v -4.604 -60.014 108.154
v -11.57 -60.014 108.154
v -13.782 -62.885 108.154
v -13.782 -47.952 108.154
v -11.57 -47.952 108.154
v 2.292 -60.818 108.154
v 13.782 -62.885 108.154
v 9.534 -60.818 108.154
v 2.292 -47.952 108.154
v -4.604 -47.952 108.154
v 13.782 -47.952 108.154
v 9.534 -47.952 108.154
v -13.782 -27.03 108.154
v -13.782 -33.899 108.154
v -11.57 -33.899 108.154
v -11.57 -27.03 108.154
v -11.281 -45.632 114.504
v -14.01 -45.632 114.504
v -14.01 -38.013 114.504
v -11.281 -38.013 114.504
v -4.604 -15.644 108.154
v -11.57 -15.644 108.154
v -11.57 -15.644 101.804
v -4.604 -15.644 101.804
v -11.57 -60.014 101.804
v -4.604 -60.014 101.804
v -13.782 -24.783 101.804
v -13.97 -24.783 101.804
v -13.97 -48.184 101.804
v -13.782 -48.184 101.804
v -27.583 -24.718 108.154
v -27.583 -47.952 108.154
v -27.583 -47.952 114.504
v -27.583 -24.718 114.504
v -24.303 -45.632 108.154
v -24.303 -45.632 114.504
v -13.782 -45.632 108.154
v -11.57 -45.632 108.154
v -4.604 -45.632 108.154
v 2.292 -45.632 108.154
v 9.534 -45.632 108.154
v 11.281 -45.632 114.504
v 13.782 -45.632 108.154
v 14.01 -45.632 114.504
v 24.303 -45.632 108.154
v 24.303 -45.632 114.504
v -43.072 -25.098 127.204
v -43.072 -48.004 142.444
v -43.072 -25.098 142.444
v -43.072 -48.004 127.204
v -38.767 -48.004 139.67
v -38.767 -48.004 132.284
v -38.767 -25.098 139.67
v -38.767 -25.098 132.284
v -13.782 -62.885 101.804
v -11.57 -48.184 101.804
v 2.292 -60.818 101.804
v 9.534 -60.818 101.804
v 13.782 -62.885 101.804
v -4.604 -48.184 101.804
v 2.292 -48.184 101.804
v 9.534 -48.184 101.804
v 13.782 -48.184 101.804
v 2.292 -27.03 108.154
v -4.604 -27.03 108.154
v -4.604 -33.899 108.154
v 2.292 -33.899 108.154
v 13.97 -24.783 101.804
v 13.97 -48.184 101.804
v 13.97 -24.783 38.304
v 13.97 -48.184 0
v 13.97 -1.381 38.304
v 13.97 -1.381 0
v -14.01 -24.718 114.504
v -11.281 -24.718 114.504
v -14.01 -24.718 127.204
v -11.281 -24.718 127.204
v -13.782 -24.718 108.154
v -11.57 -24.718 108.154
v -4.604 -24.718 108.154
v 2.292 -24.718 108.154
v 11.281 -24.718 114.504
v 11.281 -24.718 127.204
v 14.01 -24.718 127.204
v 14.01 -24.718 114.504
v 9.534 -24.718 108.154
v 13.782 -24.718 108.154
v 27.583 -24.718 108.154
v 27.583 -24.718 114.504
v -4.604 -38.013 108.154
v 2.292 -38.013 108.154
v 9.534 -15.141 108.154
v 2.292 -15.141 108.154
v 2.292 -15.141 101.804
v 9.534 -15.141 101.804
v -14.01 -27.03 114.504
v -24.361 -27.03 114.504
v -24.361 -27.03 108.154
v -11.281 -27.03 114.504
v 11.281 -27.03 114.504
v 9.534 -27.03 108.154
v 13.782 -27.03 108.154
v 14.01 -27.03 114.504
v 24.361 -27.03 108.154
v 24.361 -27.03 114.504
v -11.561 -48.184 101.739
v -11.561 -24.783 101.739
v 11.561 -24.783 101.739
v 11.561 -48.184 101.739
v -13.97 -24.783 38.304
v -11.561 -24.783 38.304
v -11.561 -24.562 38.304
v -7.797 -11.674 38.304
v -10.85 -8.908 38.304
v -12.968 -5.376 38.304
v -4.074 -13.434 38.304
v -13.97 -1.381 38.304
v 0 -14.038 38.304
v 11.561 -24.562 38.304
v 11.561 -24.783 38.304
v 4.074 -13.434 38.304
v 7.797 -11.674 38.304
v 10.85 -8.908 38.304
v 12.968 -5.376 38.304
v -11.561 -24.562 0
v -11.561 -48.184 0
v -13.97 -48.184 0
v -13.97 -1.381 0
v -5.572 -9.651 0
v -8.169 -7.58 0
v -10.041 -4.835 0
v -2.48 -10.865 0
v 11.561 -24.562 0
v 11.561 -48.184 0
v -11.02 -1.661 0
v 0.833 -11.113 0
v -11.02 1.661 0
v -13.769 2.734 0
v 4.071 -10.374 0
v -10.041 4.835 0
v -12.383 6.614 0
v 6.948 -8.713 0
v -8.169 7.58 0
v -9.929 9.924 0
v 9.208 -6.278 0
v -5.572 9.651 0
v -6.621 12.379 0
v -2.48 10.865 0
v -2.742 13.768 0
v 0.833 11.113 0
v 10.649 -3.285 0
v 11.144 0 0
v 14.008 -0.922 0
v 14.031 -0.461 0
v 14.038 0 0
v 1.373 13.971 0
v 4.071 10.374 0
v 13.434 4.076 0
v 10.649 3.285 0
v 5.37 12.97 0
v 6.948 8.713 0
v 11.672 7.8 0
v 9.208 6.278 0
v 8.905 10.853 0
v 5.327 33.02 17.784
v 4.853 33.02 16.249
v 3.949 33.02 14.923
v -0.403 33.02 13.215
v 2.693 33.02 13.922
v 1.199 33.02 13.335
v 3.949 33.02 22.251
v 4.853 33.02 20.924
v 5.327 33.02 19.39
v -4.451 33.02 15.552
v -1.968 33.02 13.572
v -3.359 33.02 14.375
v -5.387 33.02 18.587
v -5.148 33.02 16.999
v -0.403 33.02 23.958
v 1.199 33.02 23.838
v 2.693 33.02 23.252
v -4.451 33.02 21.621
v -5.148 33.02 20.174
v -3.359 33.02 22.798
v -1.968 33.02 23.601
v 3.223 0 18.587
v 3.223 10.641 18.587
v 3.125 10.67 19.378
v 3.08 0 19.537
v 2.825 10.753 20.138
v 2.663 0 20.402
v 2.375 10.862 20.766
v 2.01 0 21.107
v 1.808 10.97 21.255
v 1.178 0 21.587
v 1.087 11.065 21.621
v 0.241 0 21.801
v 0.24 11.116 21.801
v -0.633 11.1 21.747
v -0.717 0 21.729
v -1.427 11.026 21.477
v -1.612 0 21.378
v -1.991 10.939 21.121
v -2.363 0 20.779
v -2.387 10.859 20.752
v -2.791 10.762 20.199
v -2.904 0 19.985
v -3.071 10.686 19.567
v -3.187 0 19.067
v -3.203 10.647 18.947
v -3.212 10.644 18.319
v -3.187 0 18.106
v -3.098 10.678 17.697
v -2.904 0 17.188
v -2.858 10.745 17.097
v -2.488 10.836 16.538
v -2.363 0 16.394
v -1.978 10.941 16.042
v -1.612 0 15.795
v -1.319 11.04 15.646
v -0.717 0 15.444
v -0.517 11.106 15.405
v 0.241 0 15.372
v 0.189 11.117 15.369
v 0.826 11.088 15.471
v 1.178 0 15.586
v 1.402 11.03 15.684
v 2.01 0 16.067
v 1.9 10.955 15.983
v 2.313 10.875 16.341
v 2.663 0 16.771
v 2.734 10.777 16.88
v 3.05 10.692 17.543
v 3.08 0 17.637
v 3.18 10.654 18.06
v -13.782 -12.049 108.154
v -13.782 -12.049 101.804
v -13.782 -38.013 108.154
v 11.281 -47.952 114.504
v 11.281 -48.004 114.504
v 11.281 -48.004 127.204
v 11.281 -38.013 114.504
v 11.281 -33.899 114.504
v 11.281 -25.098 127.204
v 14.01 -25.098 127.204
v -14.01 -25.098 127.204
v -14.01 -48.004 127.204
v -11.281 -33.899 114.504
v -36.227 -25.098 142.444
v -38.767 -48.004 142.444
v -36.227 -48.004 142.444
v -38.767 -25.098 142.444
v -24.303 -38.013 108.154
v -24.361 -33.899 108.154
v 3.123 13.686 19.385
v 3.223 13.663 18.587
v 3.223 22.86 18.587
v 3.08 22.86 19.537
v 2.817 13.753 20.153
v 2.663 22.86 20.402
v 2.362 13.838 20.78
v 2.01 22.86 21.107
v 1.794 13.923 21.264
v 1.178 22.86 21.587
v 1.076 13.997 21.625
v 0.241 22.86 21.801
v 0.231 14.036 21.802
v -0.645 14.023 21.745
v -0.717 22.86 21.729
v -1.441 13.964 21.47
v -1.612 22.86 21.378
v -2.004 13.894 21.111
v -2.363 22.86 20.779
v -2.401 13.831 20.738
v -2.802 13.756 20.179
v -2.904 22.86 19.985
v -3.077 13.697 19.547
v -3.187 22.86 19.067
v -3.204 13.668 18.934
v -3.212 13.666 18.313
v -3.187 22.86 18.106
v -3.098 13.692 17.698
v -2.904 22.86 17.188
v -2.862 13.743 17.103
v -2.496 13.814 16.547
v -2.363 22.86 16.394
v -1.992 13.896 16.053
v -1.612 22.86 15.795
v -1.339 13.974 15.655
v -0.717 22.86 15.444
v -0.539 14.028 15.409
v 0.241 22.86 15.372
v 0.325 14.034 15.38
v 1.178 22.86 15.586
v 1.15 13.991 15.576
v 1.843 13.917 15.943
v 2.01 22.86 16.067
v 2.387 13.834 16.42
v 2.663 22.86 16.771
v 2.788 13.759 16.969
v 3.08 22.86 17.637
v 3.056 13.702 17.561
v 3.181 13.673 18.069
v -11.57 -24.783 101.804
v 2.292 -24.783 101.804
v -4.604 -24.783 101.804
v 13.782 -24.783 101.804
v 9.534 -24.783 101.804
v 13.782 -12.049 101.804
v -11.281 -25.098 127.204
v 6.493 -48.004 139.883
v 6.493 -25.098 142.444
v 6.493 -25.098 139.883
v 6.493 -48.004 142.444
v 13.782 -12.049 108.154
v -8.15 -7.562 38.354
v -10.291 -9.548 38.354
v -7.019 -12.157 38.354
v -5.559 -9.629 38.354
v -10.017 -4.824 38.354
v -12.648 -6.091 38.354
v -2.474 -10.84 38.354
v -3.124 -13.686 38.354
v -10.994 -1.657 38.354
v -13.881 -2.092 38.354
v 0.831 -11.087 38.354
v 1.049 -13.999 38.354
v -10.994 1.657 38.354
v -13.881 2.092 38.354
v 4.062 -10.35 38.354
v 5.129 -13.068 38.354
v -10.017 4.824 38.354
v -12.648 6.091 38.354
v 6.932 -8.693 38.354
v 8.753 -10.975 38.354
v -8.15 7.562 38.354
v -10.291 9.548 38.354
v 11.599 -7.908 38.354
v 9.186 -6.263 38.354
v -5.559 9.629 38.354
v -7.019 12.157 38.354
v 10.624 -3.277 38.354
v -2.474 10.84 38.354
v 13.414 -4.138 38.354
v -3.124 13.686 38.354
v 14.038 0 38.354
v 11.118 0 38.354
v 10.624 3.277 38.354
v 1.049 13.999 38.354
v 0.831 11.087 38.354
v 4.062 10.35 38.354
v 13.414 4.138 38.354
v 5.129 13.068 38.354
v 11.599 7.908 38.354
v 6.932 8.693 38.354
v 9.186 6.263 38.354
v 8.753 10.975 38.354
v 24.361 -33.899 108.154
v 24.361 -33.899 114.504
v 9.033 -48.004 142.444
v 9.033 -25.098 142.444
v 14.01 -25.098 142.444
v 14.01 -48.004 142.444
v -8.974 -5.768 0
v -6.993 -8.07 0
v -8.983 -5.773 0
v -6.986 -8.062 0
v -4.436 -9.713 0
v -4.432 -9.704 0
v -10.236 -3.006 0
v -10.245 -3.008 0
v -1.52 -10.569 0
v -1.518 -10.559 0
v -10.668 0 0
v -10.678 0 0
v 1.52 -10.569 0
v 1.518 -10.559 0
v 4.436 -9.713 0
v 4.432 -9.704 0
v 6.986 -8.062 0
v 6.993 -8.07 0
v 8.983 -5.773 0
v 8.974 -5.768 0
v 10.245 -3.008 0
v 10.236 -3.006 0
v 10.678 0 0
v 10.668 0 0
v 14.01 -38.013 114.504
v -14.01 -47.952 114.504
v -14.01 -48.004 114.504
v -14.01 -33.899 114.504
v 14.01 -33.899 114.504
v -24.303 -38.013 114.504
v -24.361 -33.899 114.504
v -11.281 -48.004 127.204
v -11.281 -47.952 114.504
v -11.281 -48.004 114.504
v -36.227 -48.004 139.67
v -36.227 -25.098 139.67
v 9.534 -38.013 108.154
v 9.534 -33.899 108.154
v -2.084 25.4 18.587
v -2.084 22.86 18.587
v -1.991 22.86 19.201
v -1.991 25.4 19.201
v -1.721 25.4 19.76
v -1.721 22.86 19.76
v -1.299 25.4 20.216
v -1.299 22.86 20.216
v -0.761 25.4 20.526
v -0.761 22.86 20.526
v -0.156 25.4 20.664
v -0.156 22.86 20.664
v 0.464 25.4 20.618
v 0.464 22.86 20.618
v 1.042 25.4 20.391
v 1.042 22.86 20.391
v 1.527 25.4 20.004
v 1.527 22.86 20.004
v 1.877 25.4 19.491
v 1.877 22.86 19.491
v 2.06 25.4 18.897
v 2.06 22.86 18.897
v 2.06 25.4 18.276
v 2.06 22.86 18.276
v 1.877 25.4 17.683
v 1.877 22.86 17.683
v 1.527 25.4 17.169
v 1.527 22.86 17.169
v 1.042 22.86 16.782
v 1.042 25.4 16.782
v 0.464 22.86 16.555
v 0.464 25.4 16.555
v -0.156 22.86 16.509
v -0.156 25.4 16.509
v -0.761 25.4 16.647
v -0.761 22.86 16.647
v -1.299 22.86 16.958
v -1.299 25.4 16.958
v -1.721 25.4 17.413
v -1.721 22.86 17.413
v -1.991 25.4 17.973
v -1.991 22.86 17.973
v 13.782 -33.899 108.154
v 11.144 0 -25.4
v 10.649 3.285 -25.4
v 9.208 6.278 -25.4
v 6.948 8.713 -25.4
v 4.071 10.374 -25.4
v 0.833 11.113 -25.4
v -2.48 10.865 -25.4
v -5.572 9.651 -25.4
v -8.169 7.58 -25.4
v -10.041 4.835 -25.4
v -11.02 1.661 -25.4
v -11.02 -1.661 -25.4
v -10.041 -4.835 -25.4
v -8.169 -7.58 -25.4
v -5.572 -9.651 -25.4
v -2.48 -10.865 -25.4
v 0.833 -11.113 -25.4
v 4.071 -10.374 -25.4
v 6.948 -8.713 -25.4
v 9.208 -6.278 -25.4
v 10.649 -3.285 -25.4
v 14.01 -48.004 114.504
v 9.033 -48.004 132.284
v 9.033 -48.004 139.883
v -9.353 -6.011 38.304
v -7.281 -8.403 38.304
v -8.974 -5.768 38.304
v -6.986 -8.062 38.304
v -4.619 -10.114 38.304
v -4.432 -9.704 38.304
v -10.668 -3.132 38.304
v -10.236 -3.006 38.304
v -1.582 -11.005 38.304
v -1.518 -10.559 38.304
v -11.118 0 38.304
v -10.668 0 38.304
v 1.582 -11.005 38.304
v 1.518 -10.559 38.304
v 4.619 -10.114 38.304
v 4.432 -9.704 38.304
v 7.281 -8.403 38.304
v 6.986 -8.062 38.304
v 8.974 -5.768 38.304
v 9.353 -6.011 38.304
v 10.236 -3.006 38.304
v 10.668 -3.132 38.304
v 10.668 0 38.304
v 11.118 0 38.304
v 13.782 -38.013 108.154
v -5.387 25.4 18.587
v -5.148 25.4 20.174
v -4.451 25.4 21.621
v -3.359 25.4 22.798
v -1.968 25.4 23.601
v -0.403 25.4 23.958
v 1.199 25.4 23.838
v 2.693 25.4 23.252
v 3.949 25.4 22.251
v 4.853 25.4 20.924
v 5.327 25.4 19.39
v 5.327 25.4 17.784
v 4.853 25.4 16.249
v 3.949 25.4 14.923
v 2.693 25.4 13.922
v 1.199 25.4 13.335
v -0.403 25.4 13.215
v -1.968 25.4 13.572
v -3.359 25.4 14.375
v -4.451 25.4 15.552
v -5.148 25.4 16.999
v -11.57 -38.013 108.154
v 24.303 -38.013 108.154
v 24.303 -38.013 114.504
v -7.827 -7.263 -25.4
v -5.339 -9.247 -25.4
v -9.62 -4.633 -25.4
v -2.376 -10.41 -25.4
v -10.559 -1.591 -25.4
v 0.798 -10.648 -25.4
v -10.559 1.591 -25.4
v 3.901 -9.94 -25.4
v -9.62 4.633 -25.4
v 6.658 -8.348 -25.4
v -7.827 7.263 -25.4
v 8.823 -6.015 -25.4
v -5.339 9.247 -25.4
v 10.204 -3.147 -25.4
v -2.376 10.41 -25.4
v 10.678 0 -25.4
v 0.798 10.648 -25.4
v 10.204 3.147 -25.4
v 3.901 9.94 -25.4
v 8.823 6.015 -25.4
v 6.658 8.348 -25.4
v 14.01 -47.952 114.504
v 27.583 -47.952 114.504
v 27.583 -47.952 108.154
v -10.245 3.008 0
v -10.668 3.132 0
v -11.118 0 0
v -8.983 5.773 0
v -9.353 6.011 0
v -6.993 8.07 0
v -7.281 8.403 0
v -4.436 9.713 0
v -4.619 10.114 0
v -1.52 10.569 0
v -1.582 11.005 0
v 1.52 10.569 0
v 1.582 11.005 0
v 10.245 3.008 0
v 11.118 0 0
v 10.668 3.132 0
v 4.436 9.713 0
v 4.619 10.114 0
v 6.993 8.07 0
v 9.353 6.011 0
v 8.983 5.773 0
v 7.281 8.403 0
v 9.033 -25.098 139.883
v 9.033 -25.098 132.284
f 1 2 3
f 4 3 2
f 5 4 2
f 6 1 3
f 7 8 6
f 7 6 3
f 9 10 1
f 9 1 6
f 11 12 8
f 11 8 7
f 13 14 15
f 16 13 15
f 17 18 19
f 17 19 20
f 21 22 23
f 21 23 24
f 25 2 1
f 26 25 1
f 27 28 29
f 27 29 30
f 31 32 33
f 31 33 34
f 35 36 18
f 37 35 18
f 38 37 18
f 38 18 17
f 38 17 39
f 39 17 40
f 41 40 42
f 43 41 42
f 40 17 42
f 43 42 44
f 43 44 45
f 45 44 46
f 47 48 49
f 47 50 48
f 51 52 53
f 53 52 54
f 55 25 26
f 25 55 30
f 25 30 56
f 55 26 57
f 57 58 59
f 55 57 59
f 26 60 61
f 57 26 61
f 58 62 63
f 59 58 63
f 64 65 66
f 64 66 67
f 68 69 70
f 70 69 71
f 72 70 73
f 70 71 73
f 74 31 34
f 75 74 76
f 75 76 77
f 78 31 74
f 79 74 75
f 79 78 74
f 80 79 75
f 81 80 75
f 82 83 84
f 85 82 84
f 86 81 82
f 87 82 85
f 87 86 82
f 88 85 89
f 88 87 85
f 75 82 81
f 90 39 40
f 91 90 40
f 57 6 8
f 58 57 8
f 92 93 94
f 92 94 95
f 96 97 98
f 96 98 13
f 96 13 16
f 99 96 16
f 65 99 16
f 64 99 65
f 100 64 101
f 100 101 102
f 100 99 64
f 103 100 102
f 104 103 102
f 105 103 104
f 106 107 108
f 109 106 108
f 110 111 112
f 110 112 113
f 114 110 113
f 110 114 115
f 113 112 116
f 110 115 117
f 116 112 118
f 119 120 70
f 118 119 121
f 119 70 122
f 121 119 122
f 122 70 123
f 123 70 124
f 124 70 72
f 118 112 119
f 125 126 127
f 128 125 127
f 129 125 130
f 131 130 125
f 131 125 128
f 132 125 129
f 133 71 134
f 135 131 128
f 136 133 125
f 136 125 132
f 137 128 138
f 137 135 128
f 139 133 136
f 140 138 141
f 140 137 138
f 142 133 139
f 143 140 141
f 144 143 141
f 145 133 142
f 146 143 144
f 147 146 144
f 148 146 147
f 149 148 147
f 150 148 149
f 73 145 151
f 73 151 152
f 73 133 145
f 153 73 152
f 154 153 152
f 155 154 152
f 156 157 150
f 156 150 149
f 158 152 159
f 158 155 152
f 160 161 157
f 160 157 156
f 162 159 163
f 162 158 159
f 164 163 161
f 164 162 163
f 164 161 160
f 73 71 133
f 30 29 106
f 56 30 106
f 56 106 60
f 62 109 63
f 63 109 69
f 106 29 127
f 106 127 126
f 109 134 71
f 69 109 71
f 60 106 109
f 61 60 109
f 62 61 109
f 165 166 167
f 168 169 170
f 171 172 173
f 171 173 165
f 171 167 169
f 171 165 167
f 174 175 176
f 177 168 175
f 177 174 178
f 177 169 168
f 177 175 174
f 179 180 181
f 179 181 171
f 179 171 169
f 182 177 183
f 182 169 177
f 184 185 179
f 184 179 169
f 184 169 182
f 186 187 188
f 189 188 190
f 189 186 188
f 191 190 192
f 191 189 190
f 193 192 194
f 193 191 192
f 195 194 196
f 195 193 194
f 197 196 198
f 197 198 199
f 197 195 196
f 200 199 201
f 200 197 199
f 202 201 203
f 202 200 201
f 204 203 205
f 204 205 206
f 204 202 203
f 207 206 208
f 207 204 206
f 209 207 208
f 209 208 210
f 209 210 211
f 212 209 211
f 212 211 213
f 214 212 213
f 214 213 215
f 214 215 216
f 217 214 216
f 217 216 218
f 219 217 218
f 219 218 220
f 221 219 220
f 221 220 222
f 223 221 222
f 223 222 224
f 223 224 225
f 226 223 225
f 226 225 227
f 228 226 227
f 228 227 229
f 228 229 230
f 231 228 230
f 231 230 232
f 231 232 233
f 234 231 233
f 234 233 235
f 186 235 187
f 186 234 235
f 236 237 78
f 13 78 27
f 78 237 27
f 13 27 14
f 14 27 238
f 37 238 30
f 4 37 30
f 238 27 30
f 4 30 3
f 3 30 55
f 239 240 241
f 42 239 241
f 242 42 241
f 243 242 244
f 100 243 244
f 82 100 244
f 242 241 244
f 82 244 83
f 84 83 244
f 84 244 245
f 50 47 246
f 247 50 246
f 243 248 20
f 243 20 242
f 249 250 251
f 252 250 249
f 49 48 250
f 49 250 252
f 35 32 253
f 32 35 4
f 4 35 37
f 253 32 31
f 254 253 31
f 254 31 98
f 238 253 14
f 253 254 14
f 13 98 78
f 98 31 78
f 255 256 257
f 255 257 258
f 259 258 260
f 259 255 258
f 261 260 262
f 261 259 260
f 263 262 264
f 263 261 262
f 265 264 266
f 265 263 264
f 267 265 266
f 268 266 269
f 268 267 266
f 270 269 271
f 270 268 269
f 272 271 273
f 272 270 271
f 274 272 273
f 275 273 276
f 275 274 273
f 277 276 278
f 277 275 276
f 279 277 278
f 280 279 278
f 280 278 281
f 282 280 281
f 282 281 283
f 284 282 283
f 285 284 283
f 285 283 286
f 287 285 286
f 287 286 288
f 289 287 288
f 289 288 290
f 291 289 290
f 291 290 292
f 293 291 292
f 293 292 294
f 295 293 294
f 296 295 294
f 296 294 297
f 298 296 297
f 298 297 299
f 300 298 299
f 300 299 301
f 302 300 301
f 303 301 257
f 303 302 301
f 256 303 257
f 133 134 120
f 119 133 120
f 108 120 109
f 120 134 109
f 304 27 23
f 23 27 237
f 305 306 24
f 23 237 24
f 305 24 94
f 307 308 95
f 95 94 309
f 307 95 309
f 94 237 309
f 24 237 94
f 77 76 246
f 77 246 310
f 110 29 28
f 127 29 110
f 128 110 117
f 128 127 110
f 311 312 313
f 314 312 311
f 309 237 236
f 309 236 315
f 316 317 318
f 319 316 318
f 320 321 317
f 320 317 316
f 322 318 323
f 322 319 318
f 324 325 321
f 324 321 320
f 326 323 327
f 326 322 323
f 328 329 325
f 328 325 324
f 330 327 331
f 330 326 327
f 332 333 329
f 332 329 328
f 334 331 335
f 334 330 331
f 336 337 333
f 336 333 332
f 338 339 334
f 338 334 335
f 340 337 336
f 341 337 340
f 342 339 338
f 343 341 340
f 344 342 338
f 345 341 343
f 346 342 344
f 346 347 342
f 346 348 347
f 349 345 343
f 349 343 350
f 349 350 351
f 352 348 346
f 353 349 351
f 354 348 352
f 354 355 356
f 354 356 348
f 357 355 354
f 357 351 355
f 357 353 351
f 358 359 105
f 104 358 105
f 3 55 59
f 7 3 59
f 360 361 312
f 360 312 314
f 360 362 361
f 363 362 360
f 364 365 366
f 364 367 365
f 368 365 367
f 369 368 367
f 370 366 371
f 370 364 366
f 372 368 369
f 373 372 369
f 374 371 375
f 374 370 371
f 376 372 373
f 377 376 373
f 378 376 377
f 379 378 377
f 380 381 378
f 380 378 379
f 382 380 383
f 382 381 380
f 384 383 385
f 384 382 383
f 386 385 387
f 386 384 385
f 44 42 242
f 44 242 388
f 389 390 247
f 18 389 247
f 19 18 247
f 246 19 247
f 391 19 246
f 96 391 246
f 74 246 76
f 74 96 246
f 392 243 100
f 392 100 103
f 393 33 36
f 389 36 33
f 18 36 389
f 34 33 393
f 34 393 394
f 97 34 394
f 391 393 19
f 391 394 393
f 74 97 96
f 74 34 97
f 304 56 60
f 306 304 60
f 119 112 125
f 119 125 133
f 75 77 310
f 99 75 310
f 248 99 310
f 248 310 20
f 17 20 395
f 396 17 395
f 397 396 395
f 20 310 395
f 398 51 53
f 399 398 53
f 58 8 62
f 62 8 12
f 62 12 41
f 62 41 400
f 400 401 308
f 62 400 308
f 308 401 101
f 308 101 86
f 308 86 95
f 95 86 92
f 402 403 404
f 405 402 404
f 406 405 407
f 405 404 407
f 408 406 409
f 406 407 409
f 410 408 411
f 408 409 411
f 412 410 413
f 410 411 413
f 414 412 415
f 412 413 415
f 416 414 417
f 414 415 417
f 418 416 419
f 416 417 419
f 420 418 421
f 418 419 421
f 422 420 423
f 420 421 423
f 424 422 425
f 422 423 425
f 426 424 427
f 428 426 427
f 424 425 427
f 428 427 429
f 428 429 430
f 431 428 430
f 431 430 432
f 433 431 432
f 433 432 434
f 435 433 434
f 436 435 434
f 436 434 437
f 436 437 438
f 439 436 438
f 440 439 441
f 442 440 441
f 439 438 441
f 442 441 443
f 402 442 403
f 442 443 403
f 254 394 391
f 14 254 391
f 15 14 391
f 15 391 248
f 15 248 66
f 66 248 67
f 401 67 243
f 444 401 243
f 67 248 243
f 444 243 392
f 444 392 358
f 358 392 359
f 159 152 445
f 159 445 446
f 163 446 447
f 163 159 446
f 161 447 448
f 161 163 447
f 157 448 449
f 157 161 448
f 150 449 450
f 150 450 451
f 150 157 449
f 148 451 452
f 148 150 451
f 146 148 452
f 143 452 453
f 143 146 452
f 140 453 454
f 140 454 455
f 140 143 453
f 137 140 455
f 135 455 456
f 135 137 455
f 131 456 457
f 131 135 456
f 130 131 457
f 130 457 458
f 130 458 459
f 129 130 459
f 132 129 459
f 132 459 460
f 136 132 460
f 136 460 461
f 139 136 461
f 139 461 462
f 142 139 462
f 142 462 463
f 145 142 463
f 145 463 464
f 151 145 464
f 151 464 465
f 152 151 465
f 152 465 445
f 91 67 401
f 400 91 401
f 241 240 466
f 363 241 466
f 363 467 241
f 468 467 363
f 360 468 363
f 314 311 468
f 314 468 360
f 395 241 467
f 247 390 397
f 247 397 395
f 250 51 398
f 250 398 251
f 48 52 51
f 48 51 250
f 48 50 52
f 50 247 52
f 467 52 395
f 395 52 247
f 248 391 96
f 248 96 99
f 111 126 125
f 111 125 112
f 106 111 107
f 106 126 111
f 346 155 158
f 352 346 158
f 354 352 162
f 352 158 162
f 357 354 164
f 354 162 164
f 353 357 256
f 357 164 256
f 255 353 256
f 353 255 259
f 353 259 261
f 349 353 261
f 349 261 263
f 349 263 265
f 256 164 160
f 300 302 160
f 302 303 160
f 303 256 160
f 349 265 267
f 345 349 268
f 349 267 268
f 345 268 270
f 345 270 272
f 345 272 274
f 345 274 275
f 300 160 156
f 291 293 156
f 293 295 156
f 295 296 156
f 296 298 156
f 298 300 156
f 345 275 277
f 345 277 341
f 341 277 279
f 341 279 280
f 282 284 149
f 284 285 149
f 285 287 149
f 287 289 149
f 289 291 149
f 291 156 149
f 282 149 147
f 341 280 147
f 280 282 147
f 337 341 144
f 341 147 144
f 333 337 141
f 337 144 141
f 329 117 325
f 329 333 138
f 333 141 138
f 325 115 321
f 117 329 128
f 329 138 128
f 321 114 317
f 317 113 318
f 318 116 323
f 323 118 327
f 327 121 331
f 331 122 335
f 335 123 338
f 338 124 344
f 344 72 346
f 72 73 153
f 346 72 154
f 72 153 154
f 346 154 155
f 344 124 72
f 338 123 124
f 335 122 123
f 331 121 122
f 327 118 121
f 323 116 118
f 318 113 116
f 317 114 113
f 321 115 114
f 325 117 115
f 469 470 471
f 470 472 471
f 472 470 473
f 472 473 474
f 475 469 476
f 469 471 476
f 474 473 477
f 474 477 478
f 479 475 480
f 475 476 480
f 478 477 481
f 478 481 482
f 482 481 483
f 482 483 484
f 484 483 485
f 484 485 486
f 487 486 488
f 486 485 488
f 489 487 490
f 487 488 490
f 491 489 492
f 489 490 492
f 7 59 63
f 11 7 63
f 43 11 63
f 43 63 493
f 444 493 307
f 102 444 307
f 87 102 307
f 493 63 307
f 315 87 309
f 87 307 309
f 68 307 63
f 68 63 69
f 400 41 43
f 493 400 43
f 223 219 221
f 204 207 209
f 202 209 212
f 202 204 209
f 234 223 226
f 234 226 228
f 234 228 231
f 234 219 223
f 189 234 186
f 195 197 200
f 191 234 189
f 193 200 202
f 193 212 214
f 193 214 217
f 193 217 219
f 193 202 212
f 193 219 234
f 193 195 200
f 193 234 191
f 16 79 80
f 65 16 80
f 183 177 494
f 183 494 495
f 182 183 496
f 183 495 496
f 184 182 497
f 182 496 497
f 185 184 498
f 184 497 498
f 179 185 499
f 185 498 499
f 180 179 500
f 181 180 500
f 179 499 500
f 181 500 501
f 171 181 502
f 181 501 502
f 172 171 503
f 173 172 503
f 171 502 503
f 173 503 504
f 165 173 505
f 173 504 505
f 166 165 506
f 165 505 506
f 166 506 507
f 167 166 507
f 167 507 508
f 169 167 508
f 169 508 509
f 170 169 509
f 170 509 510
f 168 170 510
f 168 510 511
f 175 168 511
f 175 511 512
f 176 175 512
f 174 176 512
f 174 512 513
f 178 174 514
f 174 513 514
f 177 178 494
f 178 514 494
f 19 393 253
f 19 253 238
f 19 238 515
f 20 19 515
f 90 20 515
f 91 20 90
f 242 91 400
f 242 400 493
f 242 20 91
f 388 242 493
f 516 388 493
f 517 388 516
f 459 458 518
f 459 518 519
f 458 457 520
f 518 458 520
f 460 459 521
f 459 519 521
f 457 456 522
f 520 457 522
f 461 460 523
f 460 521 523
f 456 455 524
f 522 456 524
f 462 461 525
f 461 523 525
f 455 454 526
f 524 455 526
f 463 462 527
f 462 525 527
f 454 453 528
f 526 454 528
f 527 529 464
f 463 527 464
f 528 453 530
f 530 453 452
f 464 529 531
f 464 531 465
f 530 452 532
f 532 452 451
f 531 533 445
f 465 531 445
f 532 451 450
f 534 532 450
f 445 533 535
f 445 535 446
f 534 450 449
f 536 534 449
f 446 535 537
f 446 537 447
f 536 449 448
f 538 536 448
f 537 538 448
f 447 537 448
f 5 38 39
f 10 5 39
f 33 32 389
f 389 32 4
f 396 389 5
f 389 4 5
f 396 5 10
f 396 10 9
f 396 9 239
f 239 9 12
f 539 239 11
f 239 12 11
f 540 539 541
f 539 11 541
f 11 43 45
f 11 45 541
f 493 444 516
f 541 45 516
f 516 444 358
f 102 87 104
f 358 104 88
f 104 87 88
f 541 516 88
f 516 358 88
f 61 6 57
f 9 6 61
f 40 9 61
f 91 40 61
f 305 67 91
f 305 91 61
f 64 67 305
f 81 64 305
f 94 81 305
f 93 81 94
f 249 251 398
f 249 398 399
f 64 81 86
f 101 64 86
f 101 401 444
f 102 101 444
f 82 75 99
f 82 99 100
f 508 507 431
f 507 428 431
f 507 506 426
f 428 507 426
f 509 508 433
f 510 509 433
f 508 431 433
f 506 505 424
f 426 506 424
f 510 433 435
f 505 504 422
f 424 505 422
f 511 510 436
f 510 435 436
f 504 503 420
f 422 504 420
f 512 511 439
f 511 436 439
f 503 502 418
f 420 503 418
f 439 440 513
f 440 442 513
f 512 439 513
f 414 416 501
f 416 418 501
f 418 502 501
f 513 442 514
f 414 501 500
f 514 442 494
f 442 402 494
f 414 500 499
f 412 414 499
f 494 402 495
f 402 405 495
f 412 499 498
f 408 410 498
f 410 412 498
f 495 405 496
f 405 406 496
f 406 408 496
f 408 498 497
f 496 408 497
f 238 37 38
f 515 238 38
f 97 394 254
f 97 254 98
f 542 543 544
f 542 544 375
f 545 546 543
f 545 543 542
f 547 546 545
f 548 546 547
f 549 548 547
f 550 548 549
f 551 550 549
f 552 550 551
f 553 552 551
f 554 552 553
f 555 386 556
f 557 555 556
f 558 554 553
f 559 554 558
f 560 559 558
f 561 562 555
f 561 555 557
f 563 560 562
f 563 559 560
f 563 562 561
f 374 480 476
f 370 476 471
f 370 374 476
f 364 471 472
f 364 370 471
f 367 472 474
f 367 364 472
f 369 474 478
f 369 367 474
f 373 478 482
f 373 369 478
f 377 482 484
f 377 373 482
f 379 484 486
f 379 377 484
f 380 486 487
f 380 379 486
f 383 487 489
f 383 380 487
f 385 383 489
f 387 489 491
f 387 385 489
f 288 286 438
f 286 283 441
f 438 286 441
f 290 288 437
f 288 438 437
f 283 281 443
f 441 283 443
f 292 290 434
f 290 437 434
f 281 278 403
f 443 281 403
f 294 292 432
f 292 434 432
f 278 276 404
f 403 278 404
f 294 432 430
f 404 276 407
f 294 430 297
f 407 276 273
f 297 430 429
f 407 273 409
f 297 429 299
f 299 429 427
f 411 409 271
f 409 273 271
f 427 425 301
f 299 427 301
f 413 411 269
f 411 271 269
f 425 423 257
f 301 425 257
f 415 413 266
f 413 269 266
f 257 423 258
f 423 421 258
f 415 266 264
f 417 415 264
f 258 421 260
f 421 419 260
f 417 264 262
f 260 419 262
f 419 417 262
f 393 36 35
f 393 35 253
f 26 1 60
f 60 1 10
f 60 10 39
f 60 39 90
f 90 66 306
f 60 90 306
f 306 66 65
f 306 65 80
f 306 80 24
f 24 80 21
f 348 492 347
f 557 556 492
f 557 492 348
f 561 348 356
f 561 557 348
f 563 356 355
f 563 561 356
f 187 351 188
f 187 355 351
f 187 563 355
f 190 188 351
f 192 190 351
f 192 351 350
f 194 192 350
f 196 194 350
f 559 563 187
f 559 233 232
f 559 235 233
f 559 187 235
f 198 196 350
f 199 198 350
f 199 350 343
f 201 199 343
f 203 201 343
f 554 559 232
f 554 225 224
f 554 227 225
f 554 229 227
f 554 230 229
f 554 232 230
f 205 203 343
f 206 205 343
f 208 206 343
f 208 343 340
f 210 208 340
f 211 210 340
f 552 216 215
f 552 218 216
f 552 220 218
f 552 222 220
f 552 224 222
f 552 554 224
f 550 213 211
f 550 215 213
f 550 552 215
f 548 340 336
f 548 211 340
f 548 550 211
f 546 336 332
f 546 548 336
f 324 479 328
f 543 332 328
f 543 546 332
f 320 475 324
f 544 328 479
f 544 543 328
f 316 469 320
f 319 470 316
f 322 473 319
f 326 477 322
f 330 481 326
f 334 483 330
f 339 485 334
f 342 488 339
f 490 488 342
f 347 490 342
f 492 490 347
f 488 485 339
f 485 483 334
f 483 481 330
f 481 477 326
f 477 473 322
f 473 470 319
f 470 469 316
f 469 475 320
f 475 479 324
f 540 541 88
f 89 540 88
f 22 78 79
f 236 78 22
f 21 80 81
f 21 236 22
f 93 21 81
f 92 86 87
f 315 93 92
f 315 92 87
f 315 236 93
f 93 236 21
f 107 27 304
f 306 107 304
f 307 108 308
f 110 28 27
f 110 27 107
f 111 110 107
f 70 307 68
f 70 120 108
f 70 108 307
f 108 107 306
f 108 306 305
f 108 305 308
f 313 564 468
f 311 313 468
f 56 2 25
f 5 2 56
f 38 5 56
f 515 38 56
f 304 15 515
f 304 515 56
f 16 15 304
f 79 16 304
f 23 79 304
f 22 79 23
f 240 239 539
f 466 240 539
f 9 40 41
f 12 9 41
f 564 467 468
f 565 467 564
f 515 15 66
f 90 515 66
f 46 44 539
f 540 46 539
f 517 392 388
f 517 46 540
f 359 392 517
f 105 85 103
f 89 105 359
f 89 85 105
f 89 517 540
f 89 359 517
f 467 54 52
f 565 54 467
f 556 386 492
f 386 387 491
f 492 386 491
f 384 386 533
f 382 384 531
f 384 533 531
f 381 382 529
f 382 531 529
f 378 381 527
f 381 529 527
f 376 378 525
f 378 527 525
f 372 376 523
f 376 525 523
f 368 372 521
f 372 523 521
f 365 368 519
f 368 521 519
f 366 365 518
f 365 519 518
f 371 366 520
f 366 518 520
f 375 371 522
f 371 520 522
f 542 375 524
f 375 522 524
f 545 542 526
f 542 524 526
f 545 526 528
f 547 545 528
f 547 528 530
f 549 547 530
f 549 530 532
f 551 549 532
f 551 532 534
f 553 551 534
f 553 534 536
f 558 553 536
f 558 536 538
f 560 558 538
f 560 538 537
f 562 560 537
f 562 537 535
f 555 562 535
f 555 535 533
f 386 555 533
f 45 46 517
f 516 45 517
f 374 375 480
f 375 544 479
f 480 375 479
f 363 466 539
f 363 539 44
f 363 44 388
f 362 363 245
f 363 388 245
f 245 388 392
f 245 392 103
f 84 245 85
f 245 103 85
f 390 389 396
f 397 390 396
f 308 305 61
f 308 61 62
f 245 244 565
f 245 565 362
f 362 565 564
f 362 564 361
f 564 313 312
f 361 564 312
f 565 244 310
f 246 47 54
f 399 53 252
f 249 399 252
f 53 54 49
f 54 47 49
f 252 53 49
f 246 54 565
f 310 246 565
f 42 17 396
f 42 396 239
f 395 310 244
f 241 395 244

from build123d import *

# Parameters (mm, degrees)
F0_R           = 11.4851473357
F1_DEPTH       = 25.4
F2_R           = 14.0381408387
F3_DEPTH       = 38.354
F4_R           = 11.1184182472
F5_DEPTH       = 40.64
F6_R           = 11.1443418508
F7_DEPTH       = 25.4
F8_R           = 10.6779324927
F9_DEPTH       = 25.4
F10_W          = 48.1841601431
F10_H          = 38.3043847978
F11_DEPTH      = 13.97
F11_DEPTH_BACK = 13.97
F12_W          = 27.94
F12_H          = 23.4013380416
F13_DEPTH      = 63.5
F14_W          = 27.5632794946
F14_H          = 12.7333622493
F14_H_2        = 23.4013380416
F14_H_3        = 14.7006912157
F15_DEPTH      = 6.35
F16_W          = 7.2420062497
F16_H          = 45.677350834
F16_W_2        = 6.9660460576
F16_H_2        = 44.3694461137
F17_DEPTH      = 6.35
F18_W          = 55.1662780344
F18_H          = 23.233897984
F19_DEPTH      = 6.35
F20_W          = 48.7214699388
F20_H          = 6.8689957261
F20_W_2        = 48.6058108509
F20_H_2        = 7.6186433434
F21_DEPTH      = 6.35
F22_W          = 23.1224743262
F22_H          = 101.739127886
F23_DEPTH      = 23.622
F24_W          = 28.0196964741
F24_H          = 23.2863202691
F25_DEPTH      = 12.7
F26_W          = 22.5610751659
F26_H          = 2.6592202485
F26_H_2        = 23.2863202691
F27_DEPTH      = 12.7
F28_W          = 54.3520981446
F28_H          = 22.9060128331
F28_W_2        = 2.7293106541
F29_DEPTH      = 5.08
F30_W          = 4.3049231172
F30_H          = 22.9060128331
F30_W_2        = 4.9764737487
F31_DEPTH      = 10.16
F32_W          = 22.9060128331
F32_H          = 2.5616861427
F33_DEPTH      = 2.54
F34_W          = 22.9060128331
F34_H          = 2.7740425909
F35_DEPTH      = 2.54
F36_R          = 10.668
F37_DEPTH      = 40.64
F38_R          = 3.2231915419
F39_DEPTH      = 22.86
F40_R          = 2.0835322845
F41_DEPTH      = 2.54
F42_R          = 5.3868280623
F43_DEPTH      = 7.62


with BuildPart() as f1:
    # F0 (on Top) → F1 (new body)
    with BuildSketch(Plane.XY):
        Circle(F0_R)
    extrude(amount=F1_DEPTH)


with BuildPart() as f3:
    # F2 (on Top) → F3 (new body)
    with BuildSketch(Plane.XY):
        Circle(F2_R)
    extrude(amount=F3_DEPTH)


with BuildPart() as f5_tool:
    # F4 (on Top) → F5 (new body)
    with BuildSketch(Plane.XY):
        Circle(F4_R)
    extrude(amount=F5_DEPTH)


with BuildPart() as f1_1:
    add(f1.part)

    # F5: cut by f5_tool
    add(f5_tool.part, mode=Mode.SUBTRACT)



with BuildPart() as f3_1:
    add(f3.part)

    # F5: cut by f5_tool
    add(f5_tool.part, mode=Mode.SUBTRACT)


with BuildPart() as f7:
    # F6 (on Top) → F7 (new body)
    with BuildSketch(Plane.XY):
        Circle(F6_R)
    extrude(amount=-F7_DEPTH)

    # F8 (on face) → F9 (cut)
    with BuildSketch(Plane(origin=(0, 0, -25.4), x_dir=(1, 0, 0), z_dir=(0, 0, -1))):
        Circle(F8_R)
    extrude(amount=-F9_DEPTH, mode=Mode.SUBTRACT)


with BuildPart() as f1_2:
    add(f1_1.part)

    add(f3_1.part)  # F11 merges F3

    add(f7.part)  # F11 merges F7
    # F10 (on Right) → F11 (join, two sides)
    with BuildSketch(Plane.YZ) as f11_sk:
        with Locations((-24.0920800716, 19.1521923989)):
            Rectangle(F10_W, F10_H)
    extrude(amount=F11_DEPTH)
    extrude(f11_sk.sketch, amount=-F11_DEPTH_BACK)

    # F12 (on face) → F13 (join)
    with BuildSketch(Plane.XY.offset(38.3043847978)):
        with Locations((0, -36.4834911223)):
            Rectangle(F12_W, F12_H)
    extrude(amount=F13_DEPTH)

    # F14 (on face) → F15 (join)
    with BuildSketch(Plane.XY.offset(101.8043847978)):
        with Locations((0, -18.4161409769)):
            Rectangle(F14_W, F14_H)
        with Locations((0, -36.4834911223)):
            Rectangle(F14_W, F14_H_2)
        with Locations((0, -55.534505751)):
            Rectangle(F14_W, F14_H_3)
    extrude(amount=F15_DEPTH)

    # F16 (on face) → F17 (cut)
    with BuildSketch(Plane.XY.offset(108.1543847978)):
        with Locations((5.9133009054, -37.9796130583)):
            Rectangle(F16_W, F16_H)
        with Locations((-8.0874641426, -37.8289176151)):
            Rectangle(F16_W_2, F16_H_2)
    extrude(amount=-F17_DEPTH, mode=Mode.SUBTRACT)

    # F18 (on face) → F19 (join)
    with BuildSketch(Plane.XY.offset(108.1543847978)):
        with Locations((0, -36.3346077502)):
            Rectangle(F18_W, F18_H)
    extrude(amount=F19_DEPTH)

    # F20 (on face) → F21 (cut)
    with BuildSketch(Plane.XY.offset(114.5043847978)):
        with Locations((0, -30.4647795856)):
            Rectangle(F20_W, F20_H)
        with Locations((0, -41.8227724731)):
            Rectangle(F20_W_2, F20_H_2)
    extrude(amount=-F21_DEPTH, mode=Mode.SUBTRACT)

    # F22 (on face) → F23 (cut)
    with BuildSketch(Plane.XZ.offset(48.1841601431)):
        with Locations((0, 50.869563943)):
            Rectangle(F22_W, F22_H)
    extrude(amount=-F23_DEPTH, mode=Mode.SUBTRACT)

    # F24 (on face) → F25 (join)
    with BuildSketch(Plane.XY.offset(114.5043847978)):
        with Locations((0, -36.3608188927)):
            Rectangle(F24_W, F24_H)
    extrude(amount=F25_DEPTH)

    # F26 (on face) → F27 (cut)
    with BuildSketch(Plane.XY.offset(127.2043847978)):
        with Locations((0, -49.3335891515)):
            Rectangle(F26_W, F26_H)
        with Locations((0, -36.3608188927)):
            Rectangle(F26_W, F26_H_2)
    extrude(amount=-F27_DEPTH, mode=Mode.SUBTRACT)

    # F28 (on face) → F29 (join)
    with BuildSketch(Plane.XY.offset(127.2043847978)):
        with Locations((-15.8955114894, -36.5509726107)):
            Rectangle(F28_W, F28_H)
        with Locations((12.64519291, -36.5509726107)):
            Rectangle(F28_W_2, F28_H)
    extrude(amount=F29_DEPTH)

    # F30 (on face) → F31 (join)
    with BuildSketch(Plane.XY.offset(132.2843847978)):
        with Locations((-40.9190990031, -36.5509726107)):
            Rectangle(F30_W, F30_H)
        with Locations((11.5216113627, -36.5509726107)):
            Rectangle(F30_W_2, F30_H)
    extrude(amount=F31_DEPTH)

    # F32 (on face) → F33 (join)
    with BuildSketch(Plane(origin=(9.0333744884, 0, 0), x_dir=(0, -1, 0), z_dir=(-1, 0, 0))):
        with Locations((36.5509726107, 141.1635417265)):
            Rectangle(F32_W, F32_H)
    extrude(amount=F33_DEPTH)

    # F34 (on face) → F35 (join)
    with BuildSketch(Plane.YZ.offset(-38.7666374445)):
        with Locations((-36.5509726107, 141.0573635024)):
            Rectangle(F34_W, F34_H)
    extrude(amount=F35_DEPTH)

    # F36 (on Top) → F37 (cut)
    with BuildSketch(Plane.XY):
        Circle(F36_R)
    extrude(amount=F37_DEPTH, mode=Mode.SUBTRACT)

    # F38 (on Front) → F39 (join)
    with BuildSketch(Plane.XZ):
        with Locations((0, 18.5866560787)):
            Circle(F38_R)
    extrude(amount=-F39_DEPTH)

    # F40 (on face) → F41 (join)
    with BuildSketch(Plane(origin=(0, 22.86, 0), x_dir=(-1, 0, 0), z_dir=(0, 1, 0))):
        with Locations((0, 18.5866560787)):
            Circle(F40_R)
    extrude(amount=F41_DEPTH)

    # F42 (on face) → F43 (join)
    with BuildSketch(Plane(origin=(0, 25.4, 0), x_dir=(-1, 0, 0), z_dir=(0, 1, 0))):
        with Locations((0, 18.5866560787)):
            Circle(F42_R)
    extrude(amount=F43_DEPTH)


solid = f1_2.part
